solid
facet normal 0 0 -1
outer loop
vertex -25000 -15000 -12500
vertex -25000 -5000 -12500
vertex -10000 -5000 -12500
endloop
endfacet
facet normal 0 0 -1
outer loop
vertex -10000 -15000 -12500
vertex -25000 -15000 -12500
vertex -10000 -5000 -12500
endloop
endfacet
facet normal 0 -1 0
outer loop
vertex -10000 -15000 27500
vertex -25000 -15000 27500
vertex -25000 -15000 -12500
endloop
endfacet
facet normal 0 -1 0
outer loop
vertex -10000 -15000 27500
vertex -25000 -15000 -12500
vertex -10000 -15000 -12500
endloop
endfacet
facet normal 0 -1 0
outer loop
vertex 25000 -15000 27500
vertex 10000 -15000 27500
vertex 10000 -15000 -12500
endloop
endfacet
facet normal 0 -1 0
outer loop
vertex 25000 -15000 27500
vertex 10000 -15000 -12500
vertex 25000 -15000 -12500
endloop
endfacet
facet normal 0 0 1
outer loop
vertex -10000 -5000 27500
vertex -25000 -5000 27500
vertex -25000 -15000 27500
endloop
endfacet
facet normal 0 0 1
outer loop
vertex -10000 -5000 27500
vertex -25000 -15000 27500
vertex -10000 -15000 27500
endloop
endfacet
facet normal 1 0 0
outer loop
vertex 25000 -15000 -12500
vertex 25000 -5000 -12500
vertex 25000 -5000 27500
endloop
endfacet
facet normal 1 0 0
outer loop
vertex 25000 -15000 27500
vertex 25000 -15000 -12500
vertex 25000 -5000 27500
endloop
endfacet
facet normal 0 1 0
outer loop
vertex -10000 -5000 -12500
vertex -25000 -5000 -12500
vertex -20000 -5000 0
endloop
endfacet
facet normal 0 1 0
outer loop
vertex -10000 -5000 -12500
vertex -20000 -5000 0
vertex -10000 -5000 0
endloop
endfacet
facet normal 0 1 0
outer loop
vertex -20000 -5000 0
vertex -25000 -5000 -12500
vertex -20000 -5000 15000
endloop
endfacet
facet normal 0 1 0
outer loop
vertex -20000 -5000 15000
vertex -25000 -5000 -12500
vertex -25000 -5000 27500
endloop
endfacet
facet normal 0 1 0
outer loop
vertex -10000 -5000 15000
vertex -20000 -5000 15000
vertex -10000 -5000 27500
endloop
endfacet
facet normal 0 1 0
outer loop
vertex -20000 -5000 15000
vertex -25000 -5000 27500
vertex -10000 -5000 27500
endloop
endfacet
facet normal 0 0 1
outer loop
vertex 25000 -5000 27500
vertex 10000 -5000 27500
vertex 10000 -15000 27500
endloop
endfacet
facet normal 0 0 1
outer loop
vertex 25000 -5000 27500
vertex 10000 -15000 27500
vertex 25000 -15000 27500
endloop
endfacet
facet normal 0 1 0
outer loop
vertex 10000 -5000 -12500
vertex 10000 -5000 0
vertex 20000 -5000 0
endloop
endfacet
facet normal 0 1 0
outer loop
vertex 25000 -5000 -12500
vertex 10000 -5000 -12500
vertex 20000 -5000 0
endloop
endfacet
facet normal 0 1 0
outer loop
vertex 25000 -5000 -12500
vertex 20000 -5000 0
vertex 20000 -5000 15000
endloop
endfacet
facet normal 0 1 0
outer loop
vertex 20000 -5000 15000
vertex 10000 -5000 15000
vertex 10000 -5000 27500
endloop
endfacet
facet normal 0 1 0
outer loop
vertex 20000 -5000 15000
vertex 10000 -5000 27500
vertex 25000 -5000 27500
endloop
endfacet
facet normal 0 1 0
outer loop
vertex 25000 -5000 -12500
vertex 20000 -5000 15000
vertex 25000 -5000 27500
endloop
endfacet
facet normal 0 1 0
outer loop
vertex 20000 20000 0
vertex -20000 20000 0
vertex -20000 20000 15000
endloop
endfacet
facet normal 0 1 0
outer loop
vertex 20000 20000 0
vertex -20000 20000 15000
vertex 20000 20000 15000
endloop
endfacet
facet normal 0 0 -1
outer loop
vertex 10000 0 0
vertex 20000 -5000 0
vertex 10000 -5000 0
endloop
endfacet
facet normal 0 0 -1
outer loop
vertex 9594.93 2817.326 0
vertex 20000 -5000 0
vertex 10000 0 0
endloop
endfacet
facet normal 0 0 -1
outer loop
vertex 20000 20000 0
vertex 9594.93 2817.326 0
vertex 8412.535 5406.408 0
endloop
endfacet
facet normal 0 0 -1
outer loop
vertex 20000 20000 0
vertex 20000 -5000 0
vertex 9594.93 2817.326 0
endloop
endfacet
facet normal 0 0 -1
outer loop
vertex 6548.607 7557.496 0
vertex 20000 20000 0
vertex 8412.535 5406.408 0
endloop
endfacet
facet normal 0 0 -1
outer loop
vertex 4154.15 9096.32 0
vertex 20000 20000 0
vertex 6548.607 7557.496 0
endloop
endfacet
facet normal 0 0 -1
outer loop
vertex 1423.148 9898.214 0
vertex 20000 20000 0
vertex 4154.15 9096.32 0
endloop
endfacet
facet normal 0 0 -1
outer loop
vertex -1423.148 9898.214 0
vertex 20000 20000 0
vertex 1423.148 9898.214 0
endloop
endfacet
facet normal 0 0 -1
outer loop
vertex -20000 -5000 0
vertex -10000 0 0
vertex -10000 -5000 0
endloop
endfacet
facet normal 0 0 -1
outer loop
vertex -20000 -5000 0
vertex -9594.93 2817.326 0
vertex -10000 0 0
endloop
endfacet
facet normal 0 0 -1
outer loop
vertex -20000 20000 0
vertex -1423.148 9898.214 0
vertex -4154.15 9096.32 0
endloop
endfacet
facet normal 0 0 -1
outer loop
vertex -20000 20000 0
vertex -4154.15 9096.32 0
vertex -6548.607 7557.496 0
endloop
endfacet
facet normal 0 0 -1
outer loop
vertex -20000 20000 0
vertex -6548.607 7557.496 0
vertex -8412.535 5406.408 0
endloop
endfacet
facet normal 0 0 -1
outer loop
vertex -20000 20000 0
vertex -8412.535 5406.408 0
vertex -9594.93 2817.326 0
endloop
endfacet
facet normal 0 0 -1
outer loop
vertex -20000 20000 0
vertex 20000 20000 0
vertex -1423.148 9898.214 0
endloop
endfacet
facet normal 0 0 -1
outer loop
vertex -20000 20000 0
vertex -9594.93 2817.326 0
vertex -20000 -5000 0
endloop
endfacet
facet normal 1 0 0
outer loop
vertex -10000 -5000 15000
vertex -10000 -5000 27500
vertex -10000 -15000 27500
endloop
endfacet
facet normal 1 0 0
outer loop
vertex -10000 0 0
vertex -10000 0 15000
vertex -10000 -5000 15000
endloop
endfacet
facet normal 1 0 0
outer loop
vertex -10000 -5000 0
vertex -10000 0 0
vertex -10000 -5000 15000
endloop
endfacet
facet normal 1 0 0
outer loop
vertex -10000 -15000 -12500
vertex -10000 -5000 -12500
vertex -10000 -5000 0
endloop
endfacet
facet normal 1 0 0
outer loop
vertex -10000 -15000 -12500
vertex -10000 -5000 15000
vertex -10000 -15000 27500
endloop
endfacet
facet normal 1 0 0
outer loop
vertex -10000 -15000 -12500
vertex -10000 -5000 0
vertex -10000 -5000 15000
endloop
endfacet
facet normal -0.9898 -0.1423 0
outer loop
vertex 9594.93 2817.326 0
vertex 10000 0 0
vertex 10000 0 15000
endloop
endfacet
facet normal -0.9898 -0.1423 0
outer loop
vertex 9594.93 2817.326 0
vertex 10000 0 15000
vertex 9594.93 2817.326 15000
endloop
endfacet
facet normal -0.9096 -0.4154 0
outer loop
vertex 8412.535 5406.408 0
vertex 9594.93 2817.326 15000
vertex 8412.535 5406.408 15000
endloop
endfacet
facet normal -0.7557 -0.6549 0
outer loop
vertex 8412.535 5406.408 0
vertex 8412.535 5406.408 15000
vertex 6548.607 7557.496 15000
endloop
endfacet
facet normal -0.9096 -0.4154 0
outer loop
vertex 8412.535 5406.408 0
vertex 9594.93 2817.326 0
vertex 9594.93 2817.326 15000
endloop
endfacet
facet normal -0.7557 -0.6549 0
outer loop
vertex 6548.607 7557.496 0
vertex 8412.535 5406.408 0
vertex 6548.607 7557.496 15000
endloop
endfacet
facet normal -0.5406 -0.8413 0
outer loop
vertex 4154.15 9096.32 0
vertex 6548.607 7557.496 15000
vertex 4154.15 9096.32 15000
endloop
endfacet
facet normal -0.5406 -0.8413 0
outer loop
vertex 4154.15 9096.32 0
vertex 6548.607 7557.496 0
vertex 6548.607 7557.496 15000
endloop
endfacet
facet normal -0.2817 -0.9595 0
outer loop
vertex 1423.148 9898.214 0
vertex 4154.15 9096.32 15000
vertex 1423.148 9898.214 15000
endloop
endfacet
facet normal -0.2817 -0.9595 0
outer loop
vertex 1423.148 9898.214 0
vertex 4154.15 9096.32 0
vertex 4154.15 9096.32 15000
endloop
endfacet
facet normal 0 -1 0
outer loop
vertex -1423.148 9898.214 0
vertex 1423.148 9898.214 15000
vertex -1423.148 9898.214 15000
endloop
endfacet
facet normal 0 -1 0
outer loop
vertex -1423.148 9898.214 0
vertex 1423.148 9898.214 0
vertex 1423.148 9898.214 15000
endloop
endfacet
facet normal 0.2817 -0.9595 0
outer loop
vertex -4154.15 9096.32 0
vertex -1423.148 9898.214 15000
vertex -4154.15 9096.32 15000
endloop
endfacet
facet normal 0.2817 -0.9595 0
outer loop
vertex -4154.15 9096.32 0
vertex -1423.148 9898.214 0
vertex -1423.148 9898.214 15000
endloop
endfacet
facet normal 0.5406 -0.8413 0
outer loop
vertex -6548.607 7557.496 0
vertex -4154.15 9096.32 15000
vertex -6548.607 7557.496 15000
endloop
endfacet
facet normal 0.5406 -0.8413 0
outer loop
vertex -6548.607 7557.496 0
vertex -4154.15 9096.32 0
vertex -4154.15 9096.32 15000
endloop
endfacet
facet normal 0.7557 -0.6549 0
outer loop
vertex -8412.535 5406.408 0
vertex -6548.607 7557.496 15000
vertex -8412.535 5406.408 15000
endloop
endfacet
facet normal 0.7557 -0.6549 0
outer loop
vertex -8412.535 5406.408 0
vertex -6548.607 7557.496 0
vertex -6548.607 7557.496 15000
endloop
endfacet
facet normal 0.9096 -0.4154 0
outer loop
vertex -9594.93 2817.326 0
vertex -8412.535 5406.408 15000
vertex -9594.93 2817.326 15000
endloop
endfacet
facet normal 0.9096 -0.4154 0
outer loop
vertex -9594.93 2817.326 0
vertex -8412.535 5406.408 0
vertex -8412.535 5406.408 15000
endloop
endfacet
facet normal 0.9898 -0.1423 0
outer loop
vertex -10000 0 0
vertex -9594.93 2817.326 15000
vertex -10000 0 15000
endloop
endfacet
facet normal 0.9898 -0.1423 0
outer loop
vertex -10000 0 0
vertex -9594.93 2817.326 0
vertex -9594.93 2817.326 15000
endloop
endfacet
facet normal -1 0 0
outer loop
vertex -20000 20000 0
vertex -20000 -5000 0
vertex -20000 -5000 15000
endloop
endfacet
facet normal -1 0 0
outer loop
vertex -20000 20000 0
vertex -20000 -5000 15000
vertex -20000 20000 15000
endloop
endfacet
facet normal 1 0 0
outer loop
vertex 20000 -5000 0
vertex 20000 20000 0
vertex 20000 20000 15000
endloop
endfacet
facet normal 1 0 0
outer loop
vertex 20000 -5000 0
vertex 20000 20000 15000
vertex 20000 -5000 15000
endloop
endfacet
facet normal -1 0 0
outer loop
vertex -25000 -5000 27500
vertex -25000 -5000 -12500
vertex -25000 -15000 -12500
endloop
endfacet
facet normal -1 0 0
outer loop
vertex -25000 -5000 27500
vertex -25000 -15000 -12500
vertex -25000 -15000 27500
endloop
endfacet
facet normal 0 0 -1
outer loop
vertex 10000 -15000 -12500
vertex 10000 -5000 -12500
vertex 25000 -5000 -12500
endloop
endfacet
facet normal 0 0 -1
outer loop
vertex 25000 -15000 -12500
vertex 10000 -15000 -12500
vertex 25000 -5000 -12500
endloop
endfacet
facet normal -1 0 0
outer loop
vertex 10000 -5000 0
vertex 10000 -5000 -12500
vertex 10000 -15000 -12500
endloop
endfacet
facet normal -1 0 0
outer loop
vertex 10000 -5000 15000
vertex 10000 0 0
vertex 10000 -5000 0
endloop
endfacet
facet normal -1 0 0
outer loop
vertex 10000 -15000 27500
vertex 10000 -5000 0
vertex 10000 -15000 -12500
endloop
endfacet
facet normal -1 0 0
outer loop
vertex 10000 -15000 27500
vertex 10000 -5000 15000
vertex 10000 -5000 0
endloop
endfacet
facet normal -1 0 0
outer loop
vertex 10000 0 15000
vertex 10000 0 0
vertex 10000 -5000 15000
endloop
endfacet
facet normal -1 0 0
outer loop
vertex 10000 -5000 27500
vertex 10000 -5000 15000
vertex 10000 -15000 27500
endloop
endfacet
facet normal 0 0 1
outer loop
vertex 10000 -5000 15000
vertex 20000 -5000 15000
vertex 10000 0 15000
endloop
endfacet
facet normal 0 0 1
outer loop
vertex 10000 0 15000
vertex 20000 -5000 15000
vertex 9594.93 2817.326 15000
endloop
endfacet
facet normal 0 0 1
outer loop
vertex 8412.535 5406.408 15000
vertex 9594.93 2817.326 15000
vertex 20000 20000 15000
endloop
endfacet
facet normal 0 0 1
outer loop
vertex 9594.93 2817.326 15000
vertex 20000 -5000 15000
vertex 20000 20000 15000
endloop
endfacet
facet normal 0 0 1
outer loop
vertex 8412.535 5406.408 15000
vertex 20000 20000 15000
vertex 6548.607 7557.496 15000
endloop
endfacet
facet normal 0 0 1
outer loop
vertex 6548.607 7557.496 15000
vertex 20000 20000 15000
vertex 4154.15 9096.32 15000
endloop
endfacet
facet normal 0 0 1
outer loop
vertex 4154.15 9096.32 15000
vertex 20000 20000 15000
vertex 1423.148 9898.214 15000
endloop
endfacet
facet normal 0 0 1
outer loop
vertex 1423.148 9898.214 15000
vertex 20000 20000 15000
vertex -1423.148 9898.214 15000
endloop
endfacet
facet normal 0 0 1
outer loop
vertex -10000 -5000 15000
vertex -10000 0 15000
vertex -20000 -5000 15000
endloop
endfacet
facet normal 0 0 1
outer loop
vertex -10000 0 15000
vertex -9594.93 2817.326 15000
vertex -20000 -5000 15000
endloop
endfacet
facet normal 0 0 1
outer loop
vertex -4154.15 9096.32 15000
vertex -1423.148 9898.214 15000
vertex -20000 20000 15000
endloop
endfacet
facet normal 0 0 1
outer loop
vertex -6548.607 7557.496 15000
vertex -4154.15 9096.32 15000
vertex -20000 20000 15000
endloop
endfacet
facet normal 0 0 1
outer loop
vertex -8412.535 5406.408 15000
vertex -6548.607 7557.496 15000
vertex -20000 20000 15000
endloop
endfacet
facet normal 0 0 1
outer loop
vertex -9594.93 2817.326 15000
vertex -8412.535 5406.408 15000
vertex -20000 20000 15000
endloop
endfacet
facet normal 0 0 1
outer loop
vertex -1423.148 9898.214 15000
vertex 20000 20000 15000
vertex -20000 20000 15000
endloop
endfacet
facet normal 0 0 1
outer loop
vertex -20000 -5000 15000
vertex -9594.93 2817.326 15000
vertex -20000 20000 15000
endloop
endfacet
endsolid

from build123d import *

# Parameters (mm, degrees)
BOSS_EXTRUDE1_DEPTH = 15000
SKETCH2_W           = 15000
SKETCH2_H           = 40000
BOSS_EXTRUDE2_DEPTH = 10000


with BuildPart() as part:
    # Sketch1 → Boss-Extrude1 (new body)
    with BuildSketch(Plane.XY):
        with BuildLine():
            Line((-10000, 0), (-10000, -5000))
            Line((-10000, -5000), (-20000, -5000))
            Line((-20000, -5000), (-20000, 20000))
            Line((-20000, 20000), (20000, 20000))
            Line((20000, 20000), (20000, -5000))
            Line((20000, -5000), (10000, -5000))
            Line((10000, -5000), (10000, 0))
            ThreePointArc((10000, 0), (0, 10000), (-10000, 0))
        make_face()
    extrude(amount=BOSS_EXTRUDE1_DEPTH)

    # Sketch2 → Boss-Extrude2 (add)
    with BuildSketch(Plane.XZ.offset(5000)):
        with Locations((17500, 7500)):
            Rectangle(SKETCH2_W, SKETCH2_H)
        with Locations((-17500, 7500)):
            Rectangle(SKETCH2_W, SKETCH2_H)
    extrude(amount=BOSS_EXTRUDE2_DEPTH)


solid = part.part
